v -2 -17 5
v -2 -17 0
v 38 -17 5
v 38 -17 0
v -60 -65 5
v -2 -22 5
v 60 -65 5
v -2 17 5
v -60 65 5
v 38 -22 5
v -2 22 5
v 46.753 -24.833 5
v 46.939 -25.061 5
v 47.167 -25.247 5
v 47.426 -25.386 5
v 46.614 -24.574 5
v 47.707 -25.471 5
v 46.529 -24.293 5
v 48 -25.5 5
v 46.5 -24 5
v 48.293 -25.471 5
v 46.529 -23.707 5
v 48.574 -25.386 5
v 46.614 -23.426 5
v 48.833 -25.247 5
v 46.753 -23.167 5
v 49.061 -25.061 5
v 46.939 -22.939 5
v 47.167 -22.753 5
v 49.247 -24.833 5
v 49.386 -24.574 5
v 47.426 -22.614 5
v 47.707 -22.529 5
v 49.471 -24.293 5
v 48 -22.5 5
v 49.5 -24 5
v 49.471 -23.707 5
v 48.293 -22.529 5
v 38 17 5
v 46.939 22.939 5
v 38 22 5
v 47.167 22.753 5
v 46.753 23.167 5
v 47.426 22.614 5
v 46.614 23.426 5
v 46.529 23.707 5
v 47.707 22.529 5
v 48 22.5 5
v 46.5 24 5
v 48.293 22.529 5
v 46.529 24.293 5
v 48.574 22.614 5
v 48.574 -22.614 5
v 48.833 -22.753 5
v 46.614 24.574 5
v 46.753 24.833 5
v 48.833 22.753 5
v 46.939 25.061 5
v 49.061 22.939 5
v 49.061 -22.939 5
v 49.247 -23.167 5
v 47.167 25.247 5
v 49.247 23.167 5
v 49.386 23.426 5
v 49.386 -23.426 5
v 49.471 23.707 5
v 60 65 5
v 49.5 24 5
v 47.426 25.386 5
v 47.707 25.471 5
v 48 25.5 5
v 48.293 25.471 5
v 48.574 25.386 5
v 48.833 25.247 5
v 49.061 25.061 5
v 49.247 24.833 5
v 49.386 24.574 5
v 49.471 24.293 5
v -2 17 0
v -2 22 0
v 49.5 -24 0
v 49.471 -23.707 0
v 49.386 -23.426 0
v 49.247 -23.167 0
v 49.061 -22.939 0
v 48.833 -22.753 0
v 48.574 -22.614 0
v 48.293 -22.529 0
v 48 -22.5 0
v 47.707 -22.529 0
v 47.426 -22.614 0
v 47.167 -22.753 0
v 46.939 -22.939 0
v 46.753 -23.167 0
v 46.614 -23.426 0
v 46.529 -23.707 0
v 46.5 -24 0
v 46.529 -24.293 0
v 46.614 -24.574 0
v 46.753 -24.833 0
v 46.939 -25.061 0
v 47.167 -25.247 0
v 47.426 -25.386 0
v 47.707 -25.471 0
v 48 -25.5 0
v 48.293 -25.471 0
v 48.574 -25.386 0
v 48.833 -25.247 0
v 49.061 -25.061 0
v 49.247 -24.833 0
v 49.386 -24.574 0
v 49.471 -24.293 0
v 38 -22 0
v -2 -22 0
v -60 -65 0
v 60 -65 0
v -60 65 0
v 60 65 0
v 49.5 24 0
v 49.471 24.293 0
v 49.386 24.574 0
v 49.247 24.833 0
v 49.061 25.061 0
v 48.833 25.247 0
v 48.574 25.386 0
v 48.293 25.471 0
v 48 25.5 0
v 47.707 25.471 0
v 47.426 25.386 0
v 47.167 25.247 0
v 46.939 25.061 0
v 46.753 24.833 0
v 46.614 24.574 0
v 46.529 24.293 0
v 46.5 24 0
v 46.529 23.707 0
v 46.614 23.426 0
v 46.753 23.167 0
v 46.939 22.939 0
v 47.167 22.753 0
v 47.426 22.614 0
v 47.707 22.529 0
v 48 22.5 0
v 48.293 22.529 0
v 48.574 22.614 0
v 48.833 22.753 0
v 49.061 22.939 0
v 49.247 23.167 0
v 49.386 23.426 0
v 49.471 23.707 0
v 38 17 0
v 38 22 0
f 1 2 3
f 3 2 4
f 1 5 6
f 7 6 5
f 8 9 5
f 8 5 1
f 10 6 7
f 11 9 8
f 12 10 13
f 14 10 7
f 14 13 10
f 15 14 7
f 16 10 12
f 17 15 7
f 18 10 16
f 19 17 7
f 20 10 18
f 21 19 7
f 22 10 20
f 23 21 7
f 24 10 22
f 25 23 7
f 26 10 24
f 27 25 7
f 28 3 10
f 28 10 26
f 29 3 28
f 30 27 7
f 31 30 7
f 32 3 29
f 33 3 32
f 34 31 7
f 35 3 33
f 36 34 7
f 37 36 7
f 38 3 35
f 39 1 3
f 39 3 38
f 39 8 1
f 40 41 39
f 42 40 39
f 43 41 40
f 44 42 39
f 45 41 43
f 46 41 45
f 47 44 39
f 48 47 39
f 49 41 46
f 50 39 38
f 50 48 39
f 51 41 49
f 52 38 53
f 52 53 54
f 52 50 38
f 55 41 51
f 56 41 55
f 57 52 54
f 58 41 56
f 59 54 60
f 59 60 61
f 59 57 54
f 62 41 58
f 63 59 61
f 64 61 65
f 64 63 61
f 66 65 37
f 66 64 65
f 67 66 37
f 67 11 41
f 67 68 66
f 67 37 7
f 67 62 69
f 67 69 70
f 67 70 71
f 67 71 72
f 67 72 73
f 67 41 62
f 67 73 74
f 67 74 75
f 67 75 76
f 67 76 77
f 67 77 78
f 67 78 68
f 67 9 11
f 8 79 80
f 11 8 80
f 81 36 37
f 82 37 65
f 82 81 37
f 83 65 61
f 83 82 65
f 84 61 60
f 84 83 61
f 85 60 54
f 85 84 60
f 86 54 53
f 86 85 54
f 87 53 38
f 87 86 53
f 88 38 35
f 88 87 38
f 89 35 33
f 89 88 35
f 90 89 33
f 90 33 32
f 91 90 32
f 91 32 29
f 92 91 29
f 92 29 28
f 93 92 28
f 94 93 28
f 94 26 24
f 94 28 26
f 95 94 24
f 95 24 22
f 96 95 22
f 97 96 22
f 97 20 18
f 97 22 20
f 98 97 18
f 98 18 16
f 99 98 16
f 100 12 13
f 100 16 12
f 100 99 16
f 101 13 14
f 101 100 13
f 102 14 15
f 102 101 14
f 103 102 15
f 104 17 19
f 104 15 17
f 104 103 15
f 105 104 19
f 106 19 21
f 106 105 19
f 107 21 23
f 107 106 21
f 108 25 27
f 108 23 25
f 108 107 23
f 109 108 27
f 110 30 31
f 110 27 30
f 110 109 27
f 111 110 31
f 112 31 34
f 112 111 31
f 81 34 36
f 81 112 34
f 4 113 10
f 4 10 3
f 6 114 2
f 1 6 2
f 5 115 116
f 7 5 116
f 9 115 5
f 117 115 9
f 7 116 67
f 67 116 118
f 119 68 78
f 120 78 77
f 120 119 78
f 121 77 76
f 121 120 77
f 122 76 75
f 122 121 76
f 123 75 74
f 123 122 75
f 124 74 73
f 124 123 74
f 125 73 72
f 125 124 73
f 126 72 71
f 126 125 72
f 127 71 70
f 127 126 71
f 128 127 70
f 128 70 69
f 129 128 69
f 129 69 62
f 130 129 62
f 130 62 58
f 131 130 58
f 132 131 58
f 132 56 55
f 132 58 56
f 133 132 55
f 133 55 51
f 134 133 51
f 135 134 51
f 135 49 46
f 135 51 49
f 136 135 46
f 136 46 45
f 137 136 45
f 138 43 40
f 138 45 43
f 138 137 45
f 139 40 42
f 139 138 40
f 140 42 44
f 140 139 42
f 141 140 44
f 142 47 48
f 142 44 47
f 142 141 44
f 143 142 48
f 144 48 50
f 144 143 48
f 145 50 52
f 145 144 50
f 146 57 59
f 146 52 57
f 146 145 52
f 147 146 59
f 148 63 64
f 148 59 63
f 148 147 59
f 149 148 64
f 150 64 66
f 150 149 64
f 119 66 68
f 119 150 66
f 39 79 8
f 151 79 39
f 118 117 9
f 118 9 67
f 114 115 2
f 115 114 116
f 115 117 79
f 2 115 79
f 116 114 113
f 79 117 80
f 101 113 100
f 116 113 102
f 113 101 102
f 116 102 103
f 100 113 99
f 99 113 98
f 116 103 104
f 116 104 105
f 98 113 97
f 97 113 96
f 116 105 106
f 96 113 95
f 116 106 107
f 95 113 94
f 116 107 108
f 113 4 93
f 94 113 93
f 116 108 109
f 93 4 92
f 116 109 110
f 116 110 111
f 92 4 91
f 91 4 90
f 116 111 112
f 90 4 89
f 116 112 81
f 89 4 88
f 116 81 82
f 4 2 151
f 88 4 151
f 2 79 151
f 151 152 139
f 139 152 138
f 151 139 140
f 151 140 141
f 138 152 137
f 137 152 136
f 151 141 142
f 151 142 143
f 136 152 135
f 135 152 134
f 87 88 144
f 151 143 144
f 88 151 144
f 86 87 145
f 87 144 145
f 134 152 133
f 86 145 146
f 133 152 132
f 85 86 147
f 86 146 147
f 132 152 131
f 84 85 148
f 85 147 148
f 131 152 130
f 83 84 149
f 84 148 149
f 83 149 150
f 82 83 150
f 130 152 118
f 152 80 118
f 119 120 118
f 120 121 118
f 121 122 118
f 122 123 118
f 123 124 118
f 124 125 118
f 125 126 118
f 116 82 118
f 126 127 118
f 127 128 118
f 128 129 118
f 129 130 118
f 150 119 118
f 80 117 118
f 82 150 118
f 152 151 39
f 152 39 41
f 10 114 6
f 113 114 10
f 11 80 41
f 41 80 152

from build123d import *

# Parameters (mm, degrees)
SKETCH2_W           = 120
SKETCH2_H           = 130
BOSS_EXTRUDE1_DEPTH = 5
SKETCH3_R           = 1.5
SKETCH3_W           = 40
SKETCH3_H           = 5
CUT_EXTRUDE1_DEPTH  = 6


with BuildPart() as part:
    # Sketch2 → Boss-Extrude1 (new body)
    with BuildSketch(Plane.XY):
        Rectangle(SKETCH2_W, SKETCH2_H)
    extrude(amount=BOSS_EXTRUDE1_DEPTH)

    # Sketch3 → Cut-Extrude1 (cut, through all)
    with BuildSketch(Plane.XY):
        with Locations((48, 24)):
            Circle(SKETCH3_R)
        with Locations((48, -24)):
            Circle(SKETCH3_R)
        with Locations((18, 19.5)):
            Rectangle(SKETCH3_W, SKETCH3_H)
        with Locations((18, -19.5)):
            Rectangle(SKETCH3_W, SKETCH3_H)
    extrude(amount=CUT_EXTRUDE1_DEPTH, mode=Mode.SUBTRACT)


solid = part.part
